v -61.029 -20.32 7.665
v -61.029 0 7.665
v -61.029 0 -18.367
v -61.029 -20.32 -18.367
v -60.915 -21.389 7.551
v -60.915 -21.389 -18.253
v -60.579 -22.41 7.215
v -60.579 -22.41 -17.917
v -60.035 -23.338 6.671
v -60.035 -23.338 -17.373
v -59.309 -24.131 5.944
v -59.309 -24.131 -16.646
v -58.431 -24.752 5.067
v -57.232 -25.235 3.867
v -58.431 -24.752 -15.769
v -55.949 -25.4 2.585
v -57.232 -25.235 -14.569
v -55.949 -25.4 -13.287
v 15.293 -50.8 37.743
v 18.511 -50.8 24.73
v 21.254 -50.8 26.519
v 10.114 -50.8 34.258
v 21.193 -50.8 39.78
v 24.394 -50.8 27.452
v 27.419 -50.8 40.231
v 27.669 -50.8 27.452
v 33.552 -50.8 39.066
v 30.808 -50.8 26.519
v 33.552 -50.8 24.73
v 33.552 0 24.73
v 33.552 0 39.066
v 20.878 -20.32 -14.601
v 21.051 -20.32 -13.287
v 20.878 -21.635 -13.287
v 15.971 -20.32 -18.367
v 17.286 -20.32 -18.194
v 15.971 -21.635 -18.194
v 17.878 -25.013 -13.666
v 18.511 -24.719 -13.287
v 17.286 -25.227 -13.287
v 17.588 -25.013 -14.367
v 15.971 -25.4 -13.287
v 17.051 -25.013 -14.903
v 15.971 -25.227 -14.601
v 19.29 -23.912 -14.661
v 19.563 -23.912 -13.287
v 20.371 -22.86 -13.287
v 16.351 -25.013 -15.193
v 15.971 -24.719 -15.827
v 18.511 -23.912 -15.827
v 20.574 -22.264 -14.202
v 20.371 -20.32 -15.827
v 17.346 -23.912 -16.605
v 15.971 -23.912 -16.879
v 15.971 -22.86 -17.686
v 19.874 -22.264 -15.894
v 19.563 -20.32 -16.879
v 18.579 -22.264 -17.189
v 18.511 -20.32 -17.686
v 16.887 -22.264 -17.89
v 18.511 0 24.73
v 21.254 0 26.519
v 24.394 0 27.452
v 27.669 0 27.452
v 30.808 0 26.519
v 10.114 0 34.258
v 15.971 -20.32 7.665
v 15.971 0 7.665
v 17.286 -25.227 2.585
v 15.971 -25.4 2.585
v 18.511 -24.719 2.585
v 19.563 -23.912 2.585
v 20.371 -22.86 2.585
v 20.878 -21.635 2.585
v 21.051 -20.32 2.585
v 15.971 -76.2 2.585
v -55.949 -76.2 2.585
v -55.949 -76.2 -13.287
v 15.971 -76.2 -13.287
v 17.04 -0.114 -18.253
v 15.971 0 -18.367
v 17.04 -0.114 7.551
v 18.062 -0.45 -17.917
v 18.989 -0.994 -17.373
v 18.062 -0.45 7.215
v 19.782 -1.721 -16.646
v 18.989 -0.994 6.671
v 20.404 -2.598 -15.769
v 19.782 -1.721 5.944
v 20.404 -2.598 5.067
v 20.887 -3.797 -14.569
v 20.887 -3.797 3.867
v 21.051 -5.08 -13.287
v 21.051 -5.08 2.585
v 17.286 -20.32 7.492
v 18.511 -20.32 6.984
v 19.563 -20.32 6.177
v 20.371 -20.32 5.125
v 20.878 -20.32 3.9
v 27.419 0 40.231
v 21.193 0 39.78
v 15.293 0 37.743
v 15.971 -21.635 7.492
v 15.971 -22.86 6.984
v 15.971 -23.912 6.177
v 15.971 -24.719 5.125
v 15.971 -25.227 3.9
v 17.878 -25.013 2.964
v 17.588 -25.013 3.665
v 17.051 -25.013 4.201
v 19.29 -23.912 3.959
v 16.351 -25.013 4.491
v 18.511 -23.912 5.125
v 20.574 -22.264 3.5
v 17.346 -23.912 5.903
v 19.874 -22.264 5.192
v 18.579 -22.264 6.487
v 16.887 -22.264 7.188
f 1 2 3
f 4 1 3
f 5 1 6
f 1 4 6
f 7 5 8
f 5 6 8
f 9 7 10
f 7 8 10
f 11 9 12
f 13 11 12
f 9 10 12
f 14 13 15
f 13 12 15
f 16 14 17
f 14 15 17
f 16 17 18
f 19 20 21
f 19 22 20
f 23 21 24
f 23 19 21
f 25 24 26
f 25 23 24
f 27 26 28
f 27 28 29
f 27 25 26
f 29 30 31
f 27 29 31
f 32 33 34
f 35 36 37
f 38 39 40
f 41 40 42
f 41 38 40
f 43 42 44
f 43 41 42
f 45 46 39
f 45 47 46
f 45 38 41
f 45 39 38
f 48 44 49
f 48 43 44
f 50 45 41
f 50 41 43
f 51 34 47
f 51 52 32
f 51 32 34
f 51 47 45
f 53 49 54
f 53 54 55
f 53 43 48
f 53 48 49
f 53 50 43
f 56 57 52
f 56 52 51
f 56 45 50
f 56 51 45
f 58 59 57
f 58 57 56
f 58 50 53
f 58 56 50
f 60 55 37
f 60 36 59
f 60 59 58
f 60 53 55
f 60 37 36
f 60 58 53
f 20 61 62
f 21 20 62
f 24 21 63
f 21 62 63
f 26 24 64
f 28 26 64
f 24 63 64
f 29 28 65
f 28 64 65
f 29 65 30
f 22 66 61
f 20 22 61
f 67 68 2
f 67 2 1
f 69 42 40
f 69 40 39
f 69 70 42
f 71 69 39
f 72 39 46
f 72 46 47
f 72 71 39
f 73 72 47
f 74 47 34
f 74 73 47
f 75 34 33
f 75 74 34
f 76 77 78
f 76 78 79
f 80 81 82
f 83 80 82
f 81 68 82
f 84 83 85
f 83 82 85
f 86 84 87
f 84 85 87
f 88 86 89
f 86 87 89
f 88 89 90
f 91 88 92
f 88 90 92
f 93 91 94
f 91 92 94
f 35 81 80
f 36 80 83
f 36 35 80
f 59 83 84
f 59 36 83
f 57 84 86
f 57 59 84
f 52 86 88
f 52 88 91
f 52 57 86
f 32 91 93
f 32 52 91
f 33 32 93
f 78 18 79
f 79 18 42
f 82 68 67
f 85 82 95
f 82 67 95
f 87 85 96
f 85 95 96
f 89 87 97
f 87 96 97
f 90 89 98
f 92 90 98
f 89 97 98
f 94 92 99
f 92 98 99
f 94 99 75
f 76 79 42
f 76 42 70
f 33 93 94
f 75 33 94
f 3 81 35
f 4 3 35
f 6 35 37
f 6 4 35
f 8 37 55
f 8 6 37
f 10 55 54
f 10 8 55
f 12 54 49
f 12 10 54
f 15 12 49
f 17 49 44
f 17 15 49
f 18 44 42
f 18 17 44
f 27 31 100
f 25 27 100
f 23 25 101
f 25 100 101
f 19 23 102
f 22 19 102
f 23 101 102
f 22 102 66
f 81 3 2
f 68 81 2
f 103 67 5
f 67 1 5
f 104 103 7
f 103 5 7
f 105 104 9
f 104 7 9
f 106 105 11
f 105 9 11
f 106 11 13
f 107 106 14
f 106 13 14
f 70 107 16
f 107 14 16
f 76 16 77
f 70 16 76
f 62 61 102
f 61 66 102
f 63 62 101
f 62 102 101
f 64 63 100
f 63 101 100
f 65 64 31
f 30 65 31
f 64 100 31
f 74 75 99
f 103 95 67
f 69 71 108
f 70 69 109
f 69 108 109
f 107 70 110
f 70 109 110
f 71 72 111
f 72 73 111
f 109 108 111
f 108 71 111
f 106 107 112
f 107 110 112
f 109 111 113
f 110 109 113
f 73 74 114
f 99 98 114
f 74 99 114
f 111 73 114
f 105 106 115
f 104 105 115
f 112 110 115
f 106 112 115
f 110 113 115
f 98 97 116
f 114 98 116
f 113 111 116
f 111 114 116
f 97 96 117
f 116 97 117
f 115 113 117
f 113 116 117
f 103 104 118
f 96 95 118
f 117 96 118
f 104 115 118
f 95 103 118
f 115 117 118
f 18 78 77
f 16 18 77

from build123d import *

# Parameters (mm, degrees)
F1_DEPTH  = 25.4
F2_DEPTH  = 2.54
F3_R      = 5.08
F2_FACE_W = 71.9204892415
F2_FACE_H = 15.8714312764
F4_DEPTH  = 50.8


with BuildPart() as f1:
    # F0 (on Front) → F1 (new body)
    with BuildSketch(Plane.XZ):
        with BuildLine():
            Line((18.5112450272, 7.6648131944), (-61.0292442143, 7.6648131944))
            Line((-61.0292442143, 7.6648131944), (-61.0292442143, -18.3666180819))
            Line((-61.0292442143, -18.3666180819), (18.5112450272, -18.3666180819))
            Line((18.5112450272, -18.3666180819), (18.5112450272, -6.671455313))
            ThreePointArc((18.5112450272, -6.671455313), (14.0685196363, -4.6934163347), (10.1139930973, -1.8628391936))
            Line((10.1139930973, -1.8628391936), (18.5112450272, 7.6648131944))
        make_face()
        with BuildLine():
            Line((18.5112450272, -6.671455313), (18.5112450272, 7.6648131944))
            Line((18.5112450272, 7.6648131944), (10.1139930973, -1.8628391936))
            ThreePointArc((10.1139930973, -1.8628391936), (14.0685196363, -4.6934163347), (18.5112450272, -6.671455313))
        make_face()
    extrude(amount=F1_DEPTH)

    # F2 (add): a face of the model
    f2_faces = [f1.faces().sort_by_distance(p)[0] for p in [
        (18.5112450272, -12.7, -5.3509024438),
    ]]
    extrude(f2_faces, amount=F2_DEPTH)

    # F3
    f3_edges = [f1.edges().sort_by_distance(p)[0] for p in [
        (21.051245, -12.7, -18.366618),
        (21.051245, -12.7, 7.664813),
        (21.051245, 0, -5.350902),
        (21.051245, -25.4, -5.350902),
        (-19.989, -25.4, 7.664813),
        (-61.029244, -25.4, -5.350902),
        (-19.989, -25.4, -18.366618),
    ]]
    fillet(f3_edges, radius=F3_R)

    # F0 (on Front) + F2_face (on face) → F4 (join)
    with BuildSketch(Plane.XZ):
        with BuildLine():
            ThreePointArc((18.5112450272, 24.7298628092), (26.0314354673, 27.5708706036), (33.5516259074, 24.7298628092))
            Line((33.5516259074, 24.7298628092), (33.5516259074, 39.0661313166))
            ThreePointArc((33.5516259074, 39.0661313166), (21.1931343978, 39.7796579617), (10.1139930973, 34.2575151972))
            Line((10.1139930973, 34.2575151972), (18.5112450272, 24.7298628092))
        make_face()
    with BuildSketch(Plane(origin=(-19.9889995936, -25.4, -5.3509024438), x_dir=(1, 0, 0), z_dir=(0, -1, 0))):
        Rectangle(F2_FACE_W, F2_FACE_H)
    extrude(amount=F4_DEPTH)


solid = f1.part
